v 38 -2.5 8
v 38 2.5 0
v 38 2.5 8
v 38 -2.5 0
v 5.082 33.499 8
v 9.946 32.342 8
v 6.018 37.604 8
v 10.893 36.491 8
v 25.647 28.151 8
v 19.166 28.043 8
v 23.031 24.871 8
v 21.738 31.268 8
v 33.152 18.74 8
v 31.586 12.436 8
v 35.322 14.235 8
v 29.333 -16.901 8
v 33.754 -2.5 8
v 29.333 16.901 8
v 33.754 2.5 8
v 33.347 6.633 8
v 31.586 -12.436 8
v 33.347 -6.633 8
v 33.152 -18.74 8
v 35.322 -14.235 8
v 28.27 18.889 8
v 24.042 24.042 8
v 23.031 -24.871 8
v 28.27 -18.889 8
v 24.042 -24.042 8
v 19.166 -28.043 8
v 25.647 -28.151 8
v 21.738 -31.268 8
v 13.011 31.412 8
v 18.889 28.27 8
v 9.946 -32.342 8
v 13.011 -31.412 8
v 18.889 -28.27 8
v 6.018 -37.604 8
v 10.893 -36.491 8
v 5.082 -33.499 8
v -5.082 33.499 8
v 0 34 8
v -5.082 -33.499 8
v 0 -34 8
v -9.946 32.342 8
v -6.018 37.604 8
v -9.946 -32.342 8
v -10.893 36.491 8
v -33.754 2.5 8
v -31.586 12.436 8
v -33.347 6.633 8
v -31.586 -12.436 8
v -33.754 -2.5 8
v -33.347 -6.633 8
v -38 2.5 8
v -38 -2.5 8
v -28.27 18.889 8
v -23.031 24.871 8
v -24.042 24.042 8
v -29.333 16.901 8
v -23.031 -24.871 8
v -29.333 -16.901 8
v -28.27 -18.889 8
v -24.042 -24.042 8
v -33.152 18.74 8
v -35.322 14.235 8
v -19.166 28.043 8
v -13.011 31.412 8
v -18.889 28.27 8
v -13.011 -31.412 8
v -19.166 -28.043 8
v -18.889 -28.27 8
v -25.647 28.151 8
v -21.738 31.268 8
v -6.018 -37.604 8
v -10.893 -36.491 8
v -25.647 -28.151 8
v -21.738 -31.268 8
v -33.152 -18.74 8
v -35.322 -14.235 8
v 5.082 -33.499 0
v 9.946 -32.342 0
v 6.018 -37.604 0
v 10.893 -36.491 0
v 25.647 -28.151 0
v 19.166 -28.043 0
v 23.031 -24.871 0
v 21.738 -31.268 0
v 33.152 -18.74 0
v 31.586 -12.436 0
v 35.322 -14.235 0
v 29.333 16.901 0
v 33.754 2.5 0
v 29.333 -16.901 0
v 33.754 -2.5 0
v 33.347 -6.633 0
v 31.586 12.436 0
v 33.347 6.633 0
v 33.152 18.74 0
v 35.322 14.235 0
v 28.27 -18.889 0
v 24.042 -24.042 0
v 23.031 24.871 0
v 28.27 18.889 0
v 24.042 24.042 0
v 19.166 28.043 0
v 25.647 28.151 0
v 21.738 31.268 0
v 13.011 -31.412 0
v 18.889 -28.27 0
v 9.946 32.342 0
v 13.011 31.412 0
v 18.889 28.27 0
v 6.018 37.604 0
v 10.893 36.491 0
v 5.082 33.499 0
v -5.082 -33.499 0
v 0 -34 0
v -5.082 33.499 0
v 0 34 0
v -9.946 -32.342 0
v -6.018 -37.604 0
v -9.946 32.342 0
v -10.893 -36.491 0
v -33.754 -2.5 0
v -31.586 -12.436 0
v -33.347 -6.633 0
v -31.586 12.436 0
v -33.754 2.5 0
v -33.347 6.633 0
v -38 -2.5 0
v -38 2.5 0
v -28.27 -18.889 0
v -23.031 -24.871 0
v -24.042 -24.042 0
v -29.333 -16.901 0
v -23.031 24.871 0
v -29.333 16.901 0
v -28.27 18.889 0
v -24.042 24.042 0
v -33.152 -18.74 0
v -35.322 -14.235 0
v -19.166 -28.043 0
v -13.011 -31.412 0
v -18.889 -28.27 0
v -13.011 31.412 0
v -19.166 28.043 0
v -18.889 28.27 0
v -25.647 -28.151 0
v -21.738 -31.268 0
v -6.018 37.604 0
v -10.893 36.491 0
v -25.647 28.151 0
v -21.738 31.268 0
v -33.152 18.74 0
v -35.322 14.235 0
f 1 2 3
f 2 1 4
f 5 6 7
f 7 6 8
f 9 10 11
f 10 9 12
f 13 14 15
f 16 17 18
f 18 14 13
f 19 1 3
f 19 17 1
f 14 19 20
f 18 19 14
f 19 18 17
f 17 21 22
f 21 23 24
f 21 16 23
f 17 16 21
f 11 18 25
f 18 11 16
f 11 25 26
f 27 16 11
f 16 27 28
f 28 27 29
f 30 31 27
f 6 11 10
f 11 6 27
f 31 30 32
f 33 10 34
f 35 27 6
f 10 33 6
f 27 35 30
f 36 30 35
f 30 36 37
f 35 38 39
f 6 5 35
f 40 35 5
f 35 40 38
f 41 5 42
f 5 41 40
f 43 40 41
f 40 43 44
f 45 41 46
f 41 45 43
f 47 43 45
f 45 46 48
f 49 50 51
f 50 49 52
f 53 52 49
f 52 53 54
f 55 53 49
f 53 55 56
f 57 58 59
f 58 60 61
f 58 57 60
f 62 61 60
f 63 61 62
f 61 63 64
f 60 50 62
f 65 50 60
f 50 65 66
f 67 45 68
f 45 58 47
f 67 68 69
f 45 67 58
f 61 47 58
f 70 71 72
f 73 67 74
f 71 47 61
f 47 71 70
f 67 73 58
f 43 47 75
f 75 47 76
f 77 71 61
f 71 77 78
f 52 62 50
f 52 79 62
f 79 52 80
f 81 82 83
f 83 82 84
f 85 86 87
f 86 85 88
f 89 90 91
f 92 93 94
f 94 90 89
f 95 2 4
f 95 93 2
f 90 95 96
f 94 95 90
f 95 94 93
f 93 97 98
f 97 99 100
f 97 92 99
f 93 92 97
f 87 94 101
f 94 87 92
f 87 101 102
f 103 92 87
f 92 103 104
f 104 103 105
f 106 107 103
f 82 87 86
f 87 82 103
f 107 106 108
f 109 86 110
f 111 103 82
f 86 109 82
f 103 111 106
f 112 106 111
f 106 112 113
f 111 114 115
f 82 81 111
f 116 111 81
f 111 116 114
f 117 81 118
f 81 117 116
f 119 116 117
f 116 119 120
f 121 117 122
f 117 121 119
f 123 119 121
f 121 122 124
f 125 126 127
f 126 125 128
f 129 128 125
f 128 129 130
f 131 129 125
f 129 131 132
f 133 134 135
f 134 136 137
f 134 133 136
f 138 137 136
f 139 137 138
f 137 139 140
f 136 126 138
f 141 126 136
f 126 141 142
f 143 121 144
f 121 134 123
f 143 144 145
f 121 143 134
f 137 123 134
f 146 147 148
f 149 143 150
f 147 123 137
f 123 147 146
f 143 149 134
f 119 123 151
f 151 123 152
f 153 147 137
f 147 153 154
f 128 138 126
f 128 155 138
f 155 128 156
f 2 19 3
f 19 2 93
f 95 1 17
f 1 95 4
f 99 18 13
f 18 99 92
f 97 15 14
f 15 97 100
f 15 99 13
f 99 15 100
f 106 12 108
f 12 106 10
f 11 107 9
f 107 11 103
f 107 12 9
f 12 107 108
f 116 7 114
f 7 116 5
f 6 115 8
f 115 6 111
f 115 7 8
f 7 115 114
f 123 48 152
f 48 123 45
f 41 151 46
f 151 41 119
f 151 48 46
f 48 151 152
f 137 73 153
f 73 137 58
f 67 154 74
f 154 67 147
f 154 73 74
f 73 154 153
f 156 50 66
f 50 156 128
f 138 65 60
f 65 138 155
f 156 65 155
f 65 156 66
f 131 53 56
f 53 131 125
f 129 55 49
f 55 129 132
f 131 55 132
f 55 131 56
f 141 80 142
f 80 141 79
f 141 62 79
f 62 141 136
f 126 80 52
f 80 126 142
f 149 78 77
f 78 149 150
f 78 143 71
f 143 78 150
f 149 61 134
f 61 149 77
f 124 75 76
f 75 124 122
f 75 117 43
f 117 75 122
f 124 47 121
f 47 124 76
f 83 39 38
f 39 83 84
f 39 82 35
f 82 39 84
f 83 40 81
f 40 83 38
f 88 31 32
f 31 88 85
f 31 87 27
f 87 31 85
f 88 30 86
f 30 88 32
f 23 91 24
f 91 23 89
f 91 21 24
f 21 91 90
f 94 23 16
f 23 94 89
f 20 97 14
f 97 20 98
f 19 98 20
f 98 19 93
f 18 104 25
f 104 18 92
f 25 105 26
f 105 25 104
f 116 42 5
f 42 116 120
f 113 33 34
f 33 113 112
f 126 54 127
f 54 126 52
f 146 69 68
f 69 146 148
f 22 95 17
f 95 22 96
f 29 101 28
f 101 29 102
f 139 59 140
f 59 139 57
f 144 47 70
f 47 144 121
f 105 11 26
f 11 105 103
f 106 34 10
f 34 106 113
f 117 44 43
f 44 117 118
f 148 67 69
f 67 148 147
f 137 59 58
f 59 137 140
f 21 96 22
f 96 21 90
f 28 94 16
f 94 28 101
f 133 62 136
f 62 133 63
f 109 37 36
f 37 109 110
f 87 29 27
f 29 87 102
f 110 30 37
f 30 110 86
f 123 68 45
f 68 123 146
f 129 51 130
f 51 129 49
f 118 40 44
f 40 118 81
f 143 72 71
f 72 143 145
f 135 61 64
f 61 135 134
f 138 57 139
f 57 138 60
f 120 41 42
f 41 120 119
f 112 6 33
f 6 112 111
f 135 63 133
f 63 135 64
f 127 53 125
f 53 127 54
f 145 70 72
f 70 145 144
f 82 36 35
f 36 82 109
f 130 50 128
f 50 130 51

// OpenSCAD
$fn = 32;

// ----------------------------------------------------------------------
// Spur blank: plain gear blank
// ----------------------------------------------------------------------

// --- parameters (mm) ---
disc_r = 34;              // blank root radius
disc_t = 8;               // blank thickness
n_teeth = 14;             // stub tooth count
tooth_w = 5;              // tooth width at the root
tooth_h = 4;              // tooth height above the root

out_r = disc_r + tooth_h;  // tip radius
bbox_x = 76.0;  // measured width over the teeth
bbox_y = 75.21;  // measured depth over the teeth

union() {
  cylinder(r = disc_r, h = disc_t);
  for (i = [0 : n_teeth - 1])
    rotate([0, 0, i * 360 / n_teeth])
      translate([disc_r - 1, -tooth_w / 2, 0])
        cube([tooth_h + 1, tooth_w, disc_t]);
}
